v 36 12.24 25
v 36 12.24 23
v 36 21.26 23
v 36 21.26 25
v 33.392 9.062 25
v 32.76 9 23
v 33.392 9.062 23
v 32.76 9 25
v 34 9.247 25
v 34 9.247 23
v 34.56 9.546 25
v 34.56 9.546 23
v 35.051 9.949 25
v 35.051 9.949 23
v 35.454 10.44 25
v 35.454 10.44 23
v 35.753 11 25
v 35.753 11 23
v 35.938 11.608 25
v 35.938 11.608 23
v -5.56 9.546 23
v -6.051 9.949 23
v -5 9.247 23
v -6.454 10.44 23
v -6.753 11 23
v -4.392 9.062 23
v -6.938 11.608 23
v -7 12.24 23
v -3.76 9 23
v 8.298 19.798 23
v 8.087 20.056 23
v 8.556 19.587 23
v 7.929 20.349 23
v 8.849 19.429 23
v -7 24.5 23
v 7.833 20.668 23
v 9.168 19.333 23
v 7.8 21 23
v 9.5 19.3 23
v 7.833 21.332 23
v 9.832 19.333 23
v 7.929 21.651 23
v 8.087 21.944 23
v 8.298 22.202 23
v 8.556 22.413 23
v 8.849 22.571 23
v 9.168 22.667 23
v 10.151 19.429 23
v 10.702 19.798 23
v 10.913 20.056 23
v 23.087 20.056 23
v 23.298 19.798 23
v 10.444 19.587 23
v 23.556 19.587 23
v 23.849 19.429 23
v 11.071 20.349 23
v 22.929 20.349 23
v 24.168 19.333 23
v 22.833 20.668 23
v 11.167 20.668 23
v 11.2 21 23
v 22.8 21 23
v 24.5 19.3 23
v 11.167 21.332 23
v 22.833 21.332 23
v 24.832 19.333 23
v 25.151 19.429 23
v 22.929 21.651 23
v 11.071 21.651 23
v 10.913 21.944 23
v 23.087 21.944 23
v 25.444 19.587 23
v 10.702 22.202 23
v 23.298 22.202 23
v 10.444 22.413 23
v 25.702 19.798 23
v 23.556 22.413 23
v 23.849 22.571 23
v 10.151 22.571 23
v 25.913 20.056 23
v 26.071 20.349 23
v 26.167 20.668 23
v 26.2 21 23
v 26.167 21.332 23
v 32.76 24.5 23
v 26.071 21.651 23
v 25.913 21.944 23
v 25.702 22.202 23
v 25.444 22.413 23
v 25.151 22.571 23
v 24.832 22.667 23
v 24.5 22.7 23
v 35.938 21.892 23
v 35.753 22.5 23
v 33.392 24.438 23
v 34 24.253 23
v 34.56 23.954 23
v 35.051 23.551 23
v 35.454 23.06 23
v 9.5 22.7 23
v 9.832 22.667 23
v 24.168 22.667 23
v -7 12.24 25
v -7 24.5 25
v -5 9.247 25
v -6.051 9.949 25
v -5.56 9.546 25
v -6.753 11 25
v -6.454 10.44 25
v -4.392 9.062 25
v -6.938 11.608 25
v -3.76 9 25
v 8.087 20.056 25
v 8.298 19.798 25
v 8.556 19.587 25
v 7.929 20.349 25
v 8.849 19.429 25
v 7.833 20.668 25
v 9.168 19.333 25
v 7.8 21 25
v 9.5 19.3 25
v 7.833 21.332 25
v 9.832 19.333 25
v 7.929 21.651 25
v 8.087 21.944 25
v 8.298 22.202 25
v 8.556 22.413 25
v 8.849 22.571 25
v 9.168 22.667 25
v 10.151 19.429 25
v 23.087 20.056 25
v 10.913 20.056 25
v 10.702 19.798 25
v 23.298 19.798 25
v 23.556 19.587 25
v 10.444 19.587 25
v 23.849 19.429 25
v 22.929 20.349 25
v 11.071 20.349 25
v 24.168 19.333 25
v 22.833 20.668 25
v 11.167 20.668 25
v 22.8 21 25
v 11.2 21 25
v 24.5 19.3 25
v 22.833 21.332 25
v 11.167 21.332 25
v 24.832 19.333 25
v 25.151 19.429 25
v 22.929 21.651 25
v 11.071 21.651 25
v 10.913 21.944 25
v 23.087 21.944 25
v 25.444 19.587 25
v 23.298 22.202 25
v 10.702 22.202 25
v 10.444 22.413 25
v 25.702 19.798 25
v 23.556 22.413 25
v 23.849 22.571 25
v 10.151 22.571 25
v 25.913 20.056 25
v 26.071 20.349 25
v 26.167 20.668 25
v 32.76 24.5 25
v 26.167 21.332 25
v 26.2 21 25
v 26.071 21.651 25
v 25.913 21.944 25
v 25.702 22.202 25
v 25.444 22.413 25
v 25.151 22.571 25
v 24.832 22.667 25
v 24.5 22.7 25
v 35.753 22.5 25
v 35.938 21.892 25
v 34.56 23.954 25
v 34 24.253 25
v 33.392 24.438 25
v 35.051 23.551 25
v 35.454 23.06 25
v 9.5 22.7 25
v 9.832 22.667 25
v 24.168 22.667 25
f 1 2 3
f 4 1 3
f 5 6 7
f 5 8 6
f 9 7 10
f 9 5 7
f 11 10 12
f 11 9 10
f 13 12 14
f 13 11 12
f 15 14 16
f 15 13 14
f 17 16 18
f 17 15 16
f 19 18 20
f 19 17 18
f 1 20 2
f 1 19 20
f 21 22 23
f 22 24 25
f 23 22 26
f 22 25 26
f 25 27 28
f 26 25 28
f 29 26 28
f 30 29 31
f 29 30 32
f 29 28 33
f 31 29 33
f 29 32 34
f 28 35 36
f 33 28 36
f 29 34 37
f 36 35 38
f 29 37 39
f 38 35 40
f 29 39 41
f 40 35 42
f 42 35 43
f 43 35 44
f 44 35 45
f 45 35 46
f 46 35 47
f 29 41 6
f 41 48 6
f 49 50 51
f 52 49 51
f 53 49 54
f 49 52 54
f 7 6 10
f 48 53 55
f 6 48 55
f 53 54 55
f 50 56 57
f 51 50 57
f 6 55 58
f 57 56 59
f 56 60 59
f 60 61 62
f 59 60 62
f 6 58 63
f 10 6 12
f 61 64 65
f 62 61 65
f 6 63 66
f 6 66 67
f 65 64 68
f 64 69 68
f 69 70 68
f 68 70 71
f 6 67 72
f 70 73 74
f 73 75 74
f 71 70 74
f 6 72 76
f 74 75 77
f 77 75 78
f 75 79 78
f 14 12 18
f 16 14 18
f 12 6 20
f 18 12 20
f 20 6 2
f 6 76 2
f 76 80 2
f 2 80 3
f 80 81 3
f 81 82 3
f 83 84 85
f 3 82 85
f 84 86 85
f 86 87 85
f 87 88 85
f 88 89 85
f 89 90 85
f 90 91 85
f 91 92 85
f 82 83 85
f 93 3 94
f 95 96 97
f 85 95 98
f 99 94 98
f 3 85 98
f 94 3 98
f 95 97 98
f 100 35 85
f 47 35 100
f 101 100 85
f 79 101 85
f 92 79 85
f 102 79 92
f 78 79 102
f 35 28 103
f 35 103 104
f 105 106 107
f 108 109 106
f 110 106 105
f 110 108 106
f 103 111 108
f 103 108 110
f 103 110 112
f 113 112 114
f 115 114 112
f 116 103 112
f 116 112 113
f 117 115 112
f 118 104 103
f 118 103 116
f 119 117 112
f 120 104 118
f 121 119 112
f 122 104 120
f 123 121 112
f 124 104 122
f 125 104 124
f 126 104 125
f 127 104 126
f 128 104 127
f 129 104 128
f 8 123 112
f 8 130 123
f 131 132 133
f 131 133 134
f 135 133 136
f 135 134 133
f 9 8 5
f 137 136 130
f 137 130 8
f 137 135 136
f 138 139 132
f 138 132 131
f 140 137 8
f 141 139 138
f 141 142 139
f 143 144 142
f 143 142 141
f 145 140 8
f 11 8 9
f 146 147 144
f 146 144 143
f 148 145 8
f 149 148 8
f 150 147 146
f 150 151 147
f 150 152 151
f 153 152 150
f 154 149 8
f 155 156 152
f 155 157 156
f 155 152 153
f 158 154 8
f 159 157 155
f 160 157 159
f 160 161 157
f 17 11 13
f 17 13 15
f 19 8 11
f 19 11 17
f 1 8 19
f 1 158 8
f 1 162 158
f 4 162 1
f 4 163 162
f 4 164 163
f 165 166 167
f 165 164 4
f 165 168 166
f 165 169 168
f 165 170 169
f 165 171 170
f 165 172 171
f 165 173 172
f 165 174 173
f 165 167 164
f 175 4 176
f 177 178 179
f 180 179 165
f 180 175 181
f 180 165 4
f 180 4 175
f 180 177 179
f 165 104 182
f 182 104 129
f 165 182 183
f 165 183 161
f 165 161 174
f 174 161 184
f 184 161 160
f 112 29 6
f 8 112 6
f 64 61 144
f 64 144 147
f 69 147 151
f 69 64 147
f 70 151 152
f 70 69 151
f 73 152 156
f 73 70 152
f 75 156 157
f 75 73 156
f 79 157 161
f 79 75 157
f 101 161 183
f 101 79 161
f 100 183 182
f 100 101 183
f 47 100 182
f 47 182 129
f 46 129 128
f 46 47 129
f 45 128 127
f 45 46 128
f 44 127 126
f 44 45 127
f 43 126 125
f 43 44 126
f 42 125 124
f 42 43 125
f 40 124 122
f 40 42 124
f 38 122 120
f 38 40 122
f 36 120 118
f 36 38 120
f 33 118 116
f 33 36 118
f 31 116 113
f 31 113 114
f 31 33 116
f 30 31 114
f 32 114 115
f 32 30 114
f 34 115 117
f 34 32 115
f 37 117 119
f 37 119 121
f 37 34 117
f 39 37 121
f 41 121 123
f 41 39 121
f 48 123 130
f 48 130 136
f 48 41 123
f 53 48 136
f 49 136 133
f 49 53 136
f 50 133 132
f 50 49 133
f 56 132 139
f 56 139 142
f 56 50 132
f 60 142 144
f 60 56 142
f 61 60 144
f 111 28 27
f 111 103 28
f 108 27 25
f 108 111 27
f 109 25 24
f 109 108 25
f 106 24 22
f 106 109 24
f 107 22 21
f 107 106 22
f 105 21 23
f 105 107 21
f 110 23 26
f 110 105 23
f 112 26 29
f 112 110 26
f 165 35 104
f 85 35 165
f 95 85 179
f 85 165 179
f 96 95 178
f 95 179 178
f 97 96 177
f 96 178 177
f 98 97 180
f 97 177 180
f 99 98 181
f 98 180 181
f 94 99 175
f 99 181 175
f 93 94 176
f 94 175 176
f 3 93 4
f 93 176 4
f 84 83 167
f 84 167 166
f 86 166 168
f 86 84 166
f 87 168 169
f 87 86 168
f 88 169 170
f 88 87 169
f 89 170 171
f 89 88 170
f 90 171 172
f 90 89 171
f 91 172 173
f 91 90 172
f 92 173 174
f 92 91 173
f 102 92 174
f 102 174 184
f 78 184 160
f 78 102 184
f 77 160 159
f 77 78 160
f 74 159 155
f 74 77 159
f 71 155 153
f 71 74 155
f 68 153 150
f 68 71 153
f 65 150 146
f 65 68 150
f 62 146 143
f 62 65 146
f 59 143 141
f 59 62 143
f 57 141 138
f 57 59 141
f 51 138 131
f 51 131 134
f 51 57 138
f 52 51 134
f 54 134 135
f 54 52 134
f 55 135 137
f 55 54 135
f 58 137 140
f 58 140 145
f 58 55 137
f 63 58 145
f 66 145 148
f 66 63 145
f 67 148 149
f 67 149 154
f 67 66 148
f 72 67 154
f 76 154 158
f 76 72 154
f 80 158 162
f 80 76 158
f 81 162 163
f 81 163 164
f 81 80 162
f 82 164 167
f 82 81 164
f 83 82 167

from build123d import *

# Parameters (mm, degrees)
CYLINDER058_R     = 1.7
CYLINDER058_DEPTH = 2
CYLINDER057_R     = 1.7
CYLINDER057_DEPTH = 2
BOX020_W          = 43
BOX020_H          = 15.5
BOX020_DEPTH      = 2
FILLET007_R       = 3.24


with BuildPart() as cylinder058:
    # Cylinder058 → Cylinder058 (new body)
    with BuildSketch(Plane(origin=(24.5, 21, 23), x_dir=(1, 0, 0), z_dir=(0, 0, 1))):
        Circle(CYLINDER058_R)
    extrude(amount=CYLINDER058_DEPTH)


with BuildPart() as deltacylinderm3:
    # Cylinder057 → Cylinder057 (new body)
    with BuildSketch(Plane(origin=(9.5, 21, 23), x_dir=(1, 0, 0), z_dir=(0, 0, 1))):
        Circle(CYLINDER057_R)
    extrude(amount=CYLINDER057_DEPTH)


with BuildPart() as belt_cover:
    # Box020 → Box020 (new body)
    with BuildSketch(Plane(origin=(-7, 9, 23), x_dir=(1, 0, 0), z_dir=(0, 0, 1))):
        with Locations((21.5, 7.75)):
            Rectangle(BOX020_W, BOX020_H)
    extrude(amount=BOX020_DEPTH)

    # Cut043: cut DeltaCylinderM3
    add(deltacylinderm3.part, mode=Mode.SUBTRACT)

    # Cut044: cut Cylinder058
    add(cylinder058.part, mode=Mode.SUBTRACT)

    # Fillet007
    fillet007_edges = [belt_cover.edges().sort_by_distance(p)[0] for p in [
        (-7, 9, 24),
        (36, 9, 24),
        (36, 24.5, 24),
    ]]
    fillet(fillet007_edges, radius=FILLET007_R)


solid = belt_cover.part
